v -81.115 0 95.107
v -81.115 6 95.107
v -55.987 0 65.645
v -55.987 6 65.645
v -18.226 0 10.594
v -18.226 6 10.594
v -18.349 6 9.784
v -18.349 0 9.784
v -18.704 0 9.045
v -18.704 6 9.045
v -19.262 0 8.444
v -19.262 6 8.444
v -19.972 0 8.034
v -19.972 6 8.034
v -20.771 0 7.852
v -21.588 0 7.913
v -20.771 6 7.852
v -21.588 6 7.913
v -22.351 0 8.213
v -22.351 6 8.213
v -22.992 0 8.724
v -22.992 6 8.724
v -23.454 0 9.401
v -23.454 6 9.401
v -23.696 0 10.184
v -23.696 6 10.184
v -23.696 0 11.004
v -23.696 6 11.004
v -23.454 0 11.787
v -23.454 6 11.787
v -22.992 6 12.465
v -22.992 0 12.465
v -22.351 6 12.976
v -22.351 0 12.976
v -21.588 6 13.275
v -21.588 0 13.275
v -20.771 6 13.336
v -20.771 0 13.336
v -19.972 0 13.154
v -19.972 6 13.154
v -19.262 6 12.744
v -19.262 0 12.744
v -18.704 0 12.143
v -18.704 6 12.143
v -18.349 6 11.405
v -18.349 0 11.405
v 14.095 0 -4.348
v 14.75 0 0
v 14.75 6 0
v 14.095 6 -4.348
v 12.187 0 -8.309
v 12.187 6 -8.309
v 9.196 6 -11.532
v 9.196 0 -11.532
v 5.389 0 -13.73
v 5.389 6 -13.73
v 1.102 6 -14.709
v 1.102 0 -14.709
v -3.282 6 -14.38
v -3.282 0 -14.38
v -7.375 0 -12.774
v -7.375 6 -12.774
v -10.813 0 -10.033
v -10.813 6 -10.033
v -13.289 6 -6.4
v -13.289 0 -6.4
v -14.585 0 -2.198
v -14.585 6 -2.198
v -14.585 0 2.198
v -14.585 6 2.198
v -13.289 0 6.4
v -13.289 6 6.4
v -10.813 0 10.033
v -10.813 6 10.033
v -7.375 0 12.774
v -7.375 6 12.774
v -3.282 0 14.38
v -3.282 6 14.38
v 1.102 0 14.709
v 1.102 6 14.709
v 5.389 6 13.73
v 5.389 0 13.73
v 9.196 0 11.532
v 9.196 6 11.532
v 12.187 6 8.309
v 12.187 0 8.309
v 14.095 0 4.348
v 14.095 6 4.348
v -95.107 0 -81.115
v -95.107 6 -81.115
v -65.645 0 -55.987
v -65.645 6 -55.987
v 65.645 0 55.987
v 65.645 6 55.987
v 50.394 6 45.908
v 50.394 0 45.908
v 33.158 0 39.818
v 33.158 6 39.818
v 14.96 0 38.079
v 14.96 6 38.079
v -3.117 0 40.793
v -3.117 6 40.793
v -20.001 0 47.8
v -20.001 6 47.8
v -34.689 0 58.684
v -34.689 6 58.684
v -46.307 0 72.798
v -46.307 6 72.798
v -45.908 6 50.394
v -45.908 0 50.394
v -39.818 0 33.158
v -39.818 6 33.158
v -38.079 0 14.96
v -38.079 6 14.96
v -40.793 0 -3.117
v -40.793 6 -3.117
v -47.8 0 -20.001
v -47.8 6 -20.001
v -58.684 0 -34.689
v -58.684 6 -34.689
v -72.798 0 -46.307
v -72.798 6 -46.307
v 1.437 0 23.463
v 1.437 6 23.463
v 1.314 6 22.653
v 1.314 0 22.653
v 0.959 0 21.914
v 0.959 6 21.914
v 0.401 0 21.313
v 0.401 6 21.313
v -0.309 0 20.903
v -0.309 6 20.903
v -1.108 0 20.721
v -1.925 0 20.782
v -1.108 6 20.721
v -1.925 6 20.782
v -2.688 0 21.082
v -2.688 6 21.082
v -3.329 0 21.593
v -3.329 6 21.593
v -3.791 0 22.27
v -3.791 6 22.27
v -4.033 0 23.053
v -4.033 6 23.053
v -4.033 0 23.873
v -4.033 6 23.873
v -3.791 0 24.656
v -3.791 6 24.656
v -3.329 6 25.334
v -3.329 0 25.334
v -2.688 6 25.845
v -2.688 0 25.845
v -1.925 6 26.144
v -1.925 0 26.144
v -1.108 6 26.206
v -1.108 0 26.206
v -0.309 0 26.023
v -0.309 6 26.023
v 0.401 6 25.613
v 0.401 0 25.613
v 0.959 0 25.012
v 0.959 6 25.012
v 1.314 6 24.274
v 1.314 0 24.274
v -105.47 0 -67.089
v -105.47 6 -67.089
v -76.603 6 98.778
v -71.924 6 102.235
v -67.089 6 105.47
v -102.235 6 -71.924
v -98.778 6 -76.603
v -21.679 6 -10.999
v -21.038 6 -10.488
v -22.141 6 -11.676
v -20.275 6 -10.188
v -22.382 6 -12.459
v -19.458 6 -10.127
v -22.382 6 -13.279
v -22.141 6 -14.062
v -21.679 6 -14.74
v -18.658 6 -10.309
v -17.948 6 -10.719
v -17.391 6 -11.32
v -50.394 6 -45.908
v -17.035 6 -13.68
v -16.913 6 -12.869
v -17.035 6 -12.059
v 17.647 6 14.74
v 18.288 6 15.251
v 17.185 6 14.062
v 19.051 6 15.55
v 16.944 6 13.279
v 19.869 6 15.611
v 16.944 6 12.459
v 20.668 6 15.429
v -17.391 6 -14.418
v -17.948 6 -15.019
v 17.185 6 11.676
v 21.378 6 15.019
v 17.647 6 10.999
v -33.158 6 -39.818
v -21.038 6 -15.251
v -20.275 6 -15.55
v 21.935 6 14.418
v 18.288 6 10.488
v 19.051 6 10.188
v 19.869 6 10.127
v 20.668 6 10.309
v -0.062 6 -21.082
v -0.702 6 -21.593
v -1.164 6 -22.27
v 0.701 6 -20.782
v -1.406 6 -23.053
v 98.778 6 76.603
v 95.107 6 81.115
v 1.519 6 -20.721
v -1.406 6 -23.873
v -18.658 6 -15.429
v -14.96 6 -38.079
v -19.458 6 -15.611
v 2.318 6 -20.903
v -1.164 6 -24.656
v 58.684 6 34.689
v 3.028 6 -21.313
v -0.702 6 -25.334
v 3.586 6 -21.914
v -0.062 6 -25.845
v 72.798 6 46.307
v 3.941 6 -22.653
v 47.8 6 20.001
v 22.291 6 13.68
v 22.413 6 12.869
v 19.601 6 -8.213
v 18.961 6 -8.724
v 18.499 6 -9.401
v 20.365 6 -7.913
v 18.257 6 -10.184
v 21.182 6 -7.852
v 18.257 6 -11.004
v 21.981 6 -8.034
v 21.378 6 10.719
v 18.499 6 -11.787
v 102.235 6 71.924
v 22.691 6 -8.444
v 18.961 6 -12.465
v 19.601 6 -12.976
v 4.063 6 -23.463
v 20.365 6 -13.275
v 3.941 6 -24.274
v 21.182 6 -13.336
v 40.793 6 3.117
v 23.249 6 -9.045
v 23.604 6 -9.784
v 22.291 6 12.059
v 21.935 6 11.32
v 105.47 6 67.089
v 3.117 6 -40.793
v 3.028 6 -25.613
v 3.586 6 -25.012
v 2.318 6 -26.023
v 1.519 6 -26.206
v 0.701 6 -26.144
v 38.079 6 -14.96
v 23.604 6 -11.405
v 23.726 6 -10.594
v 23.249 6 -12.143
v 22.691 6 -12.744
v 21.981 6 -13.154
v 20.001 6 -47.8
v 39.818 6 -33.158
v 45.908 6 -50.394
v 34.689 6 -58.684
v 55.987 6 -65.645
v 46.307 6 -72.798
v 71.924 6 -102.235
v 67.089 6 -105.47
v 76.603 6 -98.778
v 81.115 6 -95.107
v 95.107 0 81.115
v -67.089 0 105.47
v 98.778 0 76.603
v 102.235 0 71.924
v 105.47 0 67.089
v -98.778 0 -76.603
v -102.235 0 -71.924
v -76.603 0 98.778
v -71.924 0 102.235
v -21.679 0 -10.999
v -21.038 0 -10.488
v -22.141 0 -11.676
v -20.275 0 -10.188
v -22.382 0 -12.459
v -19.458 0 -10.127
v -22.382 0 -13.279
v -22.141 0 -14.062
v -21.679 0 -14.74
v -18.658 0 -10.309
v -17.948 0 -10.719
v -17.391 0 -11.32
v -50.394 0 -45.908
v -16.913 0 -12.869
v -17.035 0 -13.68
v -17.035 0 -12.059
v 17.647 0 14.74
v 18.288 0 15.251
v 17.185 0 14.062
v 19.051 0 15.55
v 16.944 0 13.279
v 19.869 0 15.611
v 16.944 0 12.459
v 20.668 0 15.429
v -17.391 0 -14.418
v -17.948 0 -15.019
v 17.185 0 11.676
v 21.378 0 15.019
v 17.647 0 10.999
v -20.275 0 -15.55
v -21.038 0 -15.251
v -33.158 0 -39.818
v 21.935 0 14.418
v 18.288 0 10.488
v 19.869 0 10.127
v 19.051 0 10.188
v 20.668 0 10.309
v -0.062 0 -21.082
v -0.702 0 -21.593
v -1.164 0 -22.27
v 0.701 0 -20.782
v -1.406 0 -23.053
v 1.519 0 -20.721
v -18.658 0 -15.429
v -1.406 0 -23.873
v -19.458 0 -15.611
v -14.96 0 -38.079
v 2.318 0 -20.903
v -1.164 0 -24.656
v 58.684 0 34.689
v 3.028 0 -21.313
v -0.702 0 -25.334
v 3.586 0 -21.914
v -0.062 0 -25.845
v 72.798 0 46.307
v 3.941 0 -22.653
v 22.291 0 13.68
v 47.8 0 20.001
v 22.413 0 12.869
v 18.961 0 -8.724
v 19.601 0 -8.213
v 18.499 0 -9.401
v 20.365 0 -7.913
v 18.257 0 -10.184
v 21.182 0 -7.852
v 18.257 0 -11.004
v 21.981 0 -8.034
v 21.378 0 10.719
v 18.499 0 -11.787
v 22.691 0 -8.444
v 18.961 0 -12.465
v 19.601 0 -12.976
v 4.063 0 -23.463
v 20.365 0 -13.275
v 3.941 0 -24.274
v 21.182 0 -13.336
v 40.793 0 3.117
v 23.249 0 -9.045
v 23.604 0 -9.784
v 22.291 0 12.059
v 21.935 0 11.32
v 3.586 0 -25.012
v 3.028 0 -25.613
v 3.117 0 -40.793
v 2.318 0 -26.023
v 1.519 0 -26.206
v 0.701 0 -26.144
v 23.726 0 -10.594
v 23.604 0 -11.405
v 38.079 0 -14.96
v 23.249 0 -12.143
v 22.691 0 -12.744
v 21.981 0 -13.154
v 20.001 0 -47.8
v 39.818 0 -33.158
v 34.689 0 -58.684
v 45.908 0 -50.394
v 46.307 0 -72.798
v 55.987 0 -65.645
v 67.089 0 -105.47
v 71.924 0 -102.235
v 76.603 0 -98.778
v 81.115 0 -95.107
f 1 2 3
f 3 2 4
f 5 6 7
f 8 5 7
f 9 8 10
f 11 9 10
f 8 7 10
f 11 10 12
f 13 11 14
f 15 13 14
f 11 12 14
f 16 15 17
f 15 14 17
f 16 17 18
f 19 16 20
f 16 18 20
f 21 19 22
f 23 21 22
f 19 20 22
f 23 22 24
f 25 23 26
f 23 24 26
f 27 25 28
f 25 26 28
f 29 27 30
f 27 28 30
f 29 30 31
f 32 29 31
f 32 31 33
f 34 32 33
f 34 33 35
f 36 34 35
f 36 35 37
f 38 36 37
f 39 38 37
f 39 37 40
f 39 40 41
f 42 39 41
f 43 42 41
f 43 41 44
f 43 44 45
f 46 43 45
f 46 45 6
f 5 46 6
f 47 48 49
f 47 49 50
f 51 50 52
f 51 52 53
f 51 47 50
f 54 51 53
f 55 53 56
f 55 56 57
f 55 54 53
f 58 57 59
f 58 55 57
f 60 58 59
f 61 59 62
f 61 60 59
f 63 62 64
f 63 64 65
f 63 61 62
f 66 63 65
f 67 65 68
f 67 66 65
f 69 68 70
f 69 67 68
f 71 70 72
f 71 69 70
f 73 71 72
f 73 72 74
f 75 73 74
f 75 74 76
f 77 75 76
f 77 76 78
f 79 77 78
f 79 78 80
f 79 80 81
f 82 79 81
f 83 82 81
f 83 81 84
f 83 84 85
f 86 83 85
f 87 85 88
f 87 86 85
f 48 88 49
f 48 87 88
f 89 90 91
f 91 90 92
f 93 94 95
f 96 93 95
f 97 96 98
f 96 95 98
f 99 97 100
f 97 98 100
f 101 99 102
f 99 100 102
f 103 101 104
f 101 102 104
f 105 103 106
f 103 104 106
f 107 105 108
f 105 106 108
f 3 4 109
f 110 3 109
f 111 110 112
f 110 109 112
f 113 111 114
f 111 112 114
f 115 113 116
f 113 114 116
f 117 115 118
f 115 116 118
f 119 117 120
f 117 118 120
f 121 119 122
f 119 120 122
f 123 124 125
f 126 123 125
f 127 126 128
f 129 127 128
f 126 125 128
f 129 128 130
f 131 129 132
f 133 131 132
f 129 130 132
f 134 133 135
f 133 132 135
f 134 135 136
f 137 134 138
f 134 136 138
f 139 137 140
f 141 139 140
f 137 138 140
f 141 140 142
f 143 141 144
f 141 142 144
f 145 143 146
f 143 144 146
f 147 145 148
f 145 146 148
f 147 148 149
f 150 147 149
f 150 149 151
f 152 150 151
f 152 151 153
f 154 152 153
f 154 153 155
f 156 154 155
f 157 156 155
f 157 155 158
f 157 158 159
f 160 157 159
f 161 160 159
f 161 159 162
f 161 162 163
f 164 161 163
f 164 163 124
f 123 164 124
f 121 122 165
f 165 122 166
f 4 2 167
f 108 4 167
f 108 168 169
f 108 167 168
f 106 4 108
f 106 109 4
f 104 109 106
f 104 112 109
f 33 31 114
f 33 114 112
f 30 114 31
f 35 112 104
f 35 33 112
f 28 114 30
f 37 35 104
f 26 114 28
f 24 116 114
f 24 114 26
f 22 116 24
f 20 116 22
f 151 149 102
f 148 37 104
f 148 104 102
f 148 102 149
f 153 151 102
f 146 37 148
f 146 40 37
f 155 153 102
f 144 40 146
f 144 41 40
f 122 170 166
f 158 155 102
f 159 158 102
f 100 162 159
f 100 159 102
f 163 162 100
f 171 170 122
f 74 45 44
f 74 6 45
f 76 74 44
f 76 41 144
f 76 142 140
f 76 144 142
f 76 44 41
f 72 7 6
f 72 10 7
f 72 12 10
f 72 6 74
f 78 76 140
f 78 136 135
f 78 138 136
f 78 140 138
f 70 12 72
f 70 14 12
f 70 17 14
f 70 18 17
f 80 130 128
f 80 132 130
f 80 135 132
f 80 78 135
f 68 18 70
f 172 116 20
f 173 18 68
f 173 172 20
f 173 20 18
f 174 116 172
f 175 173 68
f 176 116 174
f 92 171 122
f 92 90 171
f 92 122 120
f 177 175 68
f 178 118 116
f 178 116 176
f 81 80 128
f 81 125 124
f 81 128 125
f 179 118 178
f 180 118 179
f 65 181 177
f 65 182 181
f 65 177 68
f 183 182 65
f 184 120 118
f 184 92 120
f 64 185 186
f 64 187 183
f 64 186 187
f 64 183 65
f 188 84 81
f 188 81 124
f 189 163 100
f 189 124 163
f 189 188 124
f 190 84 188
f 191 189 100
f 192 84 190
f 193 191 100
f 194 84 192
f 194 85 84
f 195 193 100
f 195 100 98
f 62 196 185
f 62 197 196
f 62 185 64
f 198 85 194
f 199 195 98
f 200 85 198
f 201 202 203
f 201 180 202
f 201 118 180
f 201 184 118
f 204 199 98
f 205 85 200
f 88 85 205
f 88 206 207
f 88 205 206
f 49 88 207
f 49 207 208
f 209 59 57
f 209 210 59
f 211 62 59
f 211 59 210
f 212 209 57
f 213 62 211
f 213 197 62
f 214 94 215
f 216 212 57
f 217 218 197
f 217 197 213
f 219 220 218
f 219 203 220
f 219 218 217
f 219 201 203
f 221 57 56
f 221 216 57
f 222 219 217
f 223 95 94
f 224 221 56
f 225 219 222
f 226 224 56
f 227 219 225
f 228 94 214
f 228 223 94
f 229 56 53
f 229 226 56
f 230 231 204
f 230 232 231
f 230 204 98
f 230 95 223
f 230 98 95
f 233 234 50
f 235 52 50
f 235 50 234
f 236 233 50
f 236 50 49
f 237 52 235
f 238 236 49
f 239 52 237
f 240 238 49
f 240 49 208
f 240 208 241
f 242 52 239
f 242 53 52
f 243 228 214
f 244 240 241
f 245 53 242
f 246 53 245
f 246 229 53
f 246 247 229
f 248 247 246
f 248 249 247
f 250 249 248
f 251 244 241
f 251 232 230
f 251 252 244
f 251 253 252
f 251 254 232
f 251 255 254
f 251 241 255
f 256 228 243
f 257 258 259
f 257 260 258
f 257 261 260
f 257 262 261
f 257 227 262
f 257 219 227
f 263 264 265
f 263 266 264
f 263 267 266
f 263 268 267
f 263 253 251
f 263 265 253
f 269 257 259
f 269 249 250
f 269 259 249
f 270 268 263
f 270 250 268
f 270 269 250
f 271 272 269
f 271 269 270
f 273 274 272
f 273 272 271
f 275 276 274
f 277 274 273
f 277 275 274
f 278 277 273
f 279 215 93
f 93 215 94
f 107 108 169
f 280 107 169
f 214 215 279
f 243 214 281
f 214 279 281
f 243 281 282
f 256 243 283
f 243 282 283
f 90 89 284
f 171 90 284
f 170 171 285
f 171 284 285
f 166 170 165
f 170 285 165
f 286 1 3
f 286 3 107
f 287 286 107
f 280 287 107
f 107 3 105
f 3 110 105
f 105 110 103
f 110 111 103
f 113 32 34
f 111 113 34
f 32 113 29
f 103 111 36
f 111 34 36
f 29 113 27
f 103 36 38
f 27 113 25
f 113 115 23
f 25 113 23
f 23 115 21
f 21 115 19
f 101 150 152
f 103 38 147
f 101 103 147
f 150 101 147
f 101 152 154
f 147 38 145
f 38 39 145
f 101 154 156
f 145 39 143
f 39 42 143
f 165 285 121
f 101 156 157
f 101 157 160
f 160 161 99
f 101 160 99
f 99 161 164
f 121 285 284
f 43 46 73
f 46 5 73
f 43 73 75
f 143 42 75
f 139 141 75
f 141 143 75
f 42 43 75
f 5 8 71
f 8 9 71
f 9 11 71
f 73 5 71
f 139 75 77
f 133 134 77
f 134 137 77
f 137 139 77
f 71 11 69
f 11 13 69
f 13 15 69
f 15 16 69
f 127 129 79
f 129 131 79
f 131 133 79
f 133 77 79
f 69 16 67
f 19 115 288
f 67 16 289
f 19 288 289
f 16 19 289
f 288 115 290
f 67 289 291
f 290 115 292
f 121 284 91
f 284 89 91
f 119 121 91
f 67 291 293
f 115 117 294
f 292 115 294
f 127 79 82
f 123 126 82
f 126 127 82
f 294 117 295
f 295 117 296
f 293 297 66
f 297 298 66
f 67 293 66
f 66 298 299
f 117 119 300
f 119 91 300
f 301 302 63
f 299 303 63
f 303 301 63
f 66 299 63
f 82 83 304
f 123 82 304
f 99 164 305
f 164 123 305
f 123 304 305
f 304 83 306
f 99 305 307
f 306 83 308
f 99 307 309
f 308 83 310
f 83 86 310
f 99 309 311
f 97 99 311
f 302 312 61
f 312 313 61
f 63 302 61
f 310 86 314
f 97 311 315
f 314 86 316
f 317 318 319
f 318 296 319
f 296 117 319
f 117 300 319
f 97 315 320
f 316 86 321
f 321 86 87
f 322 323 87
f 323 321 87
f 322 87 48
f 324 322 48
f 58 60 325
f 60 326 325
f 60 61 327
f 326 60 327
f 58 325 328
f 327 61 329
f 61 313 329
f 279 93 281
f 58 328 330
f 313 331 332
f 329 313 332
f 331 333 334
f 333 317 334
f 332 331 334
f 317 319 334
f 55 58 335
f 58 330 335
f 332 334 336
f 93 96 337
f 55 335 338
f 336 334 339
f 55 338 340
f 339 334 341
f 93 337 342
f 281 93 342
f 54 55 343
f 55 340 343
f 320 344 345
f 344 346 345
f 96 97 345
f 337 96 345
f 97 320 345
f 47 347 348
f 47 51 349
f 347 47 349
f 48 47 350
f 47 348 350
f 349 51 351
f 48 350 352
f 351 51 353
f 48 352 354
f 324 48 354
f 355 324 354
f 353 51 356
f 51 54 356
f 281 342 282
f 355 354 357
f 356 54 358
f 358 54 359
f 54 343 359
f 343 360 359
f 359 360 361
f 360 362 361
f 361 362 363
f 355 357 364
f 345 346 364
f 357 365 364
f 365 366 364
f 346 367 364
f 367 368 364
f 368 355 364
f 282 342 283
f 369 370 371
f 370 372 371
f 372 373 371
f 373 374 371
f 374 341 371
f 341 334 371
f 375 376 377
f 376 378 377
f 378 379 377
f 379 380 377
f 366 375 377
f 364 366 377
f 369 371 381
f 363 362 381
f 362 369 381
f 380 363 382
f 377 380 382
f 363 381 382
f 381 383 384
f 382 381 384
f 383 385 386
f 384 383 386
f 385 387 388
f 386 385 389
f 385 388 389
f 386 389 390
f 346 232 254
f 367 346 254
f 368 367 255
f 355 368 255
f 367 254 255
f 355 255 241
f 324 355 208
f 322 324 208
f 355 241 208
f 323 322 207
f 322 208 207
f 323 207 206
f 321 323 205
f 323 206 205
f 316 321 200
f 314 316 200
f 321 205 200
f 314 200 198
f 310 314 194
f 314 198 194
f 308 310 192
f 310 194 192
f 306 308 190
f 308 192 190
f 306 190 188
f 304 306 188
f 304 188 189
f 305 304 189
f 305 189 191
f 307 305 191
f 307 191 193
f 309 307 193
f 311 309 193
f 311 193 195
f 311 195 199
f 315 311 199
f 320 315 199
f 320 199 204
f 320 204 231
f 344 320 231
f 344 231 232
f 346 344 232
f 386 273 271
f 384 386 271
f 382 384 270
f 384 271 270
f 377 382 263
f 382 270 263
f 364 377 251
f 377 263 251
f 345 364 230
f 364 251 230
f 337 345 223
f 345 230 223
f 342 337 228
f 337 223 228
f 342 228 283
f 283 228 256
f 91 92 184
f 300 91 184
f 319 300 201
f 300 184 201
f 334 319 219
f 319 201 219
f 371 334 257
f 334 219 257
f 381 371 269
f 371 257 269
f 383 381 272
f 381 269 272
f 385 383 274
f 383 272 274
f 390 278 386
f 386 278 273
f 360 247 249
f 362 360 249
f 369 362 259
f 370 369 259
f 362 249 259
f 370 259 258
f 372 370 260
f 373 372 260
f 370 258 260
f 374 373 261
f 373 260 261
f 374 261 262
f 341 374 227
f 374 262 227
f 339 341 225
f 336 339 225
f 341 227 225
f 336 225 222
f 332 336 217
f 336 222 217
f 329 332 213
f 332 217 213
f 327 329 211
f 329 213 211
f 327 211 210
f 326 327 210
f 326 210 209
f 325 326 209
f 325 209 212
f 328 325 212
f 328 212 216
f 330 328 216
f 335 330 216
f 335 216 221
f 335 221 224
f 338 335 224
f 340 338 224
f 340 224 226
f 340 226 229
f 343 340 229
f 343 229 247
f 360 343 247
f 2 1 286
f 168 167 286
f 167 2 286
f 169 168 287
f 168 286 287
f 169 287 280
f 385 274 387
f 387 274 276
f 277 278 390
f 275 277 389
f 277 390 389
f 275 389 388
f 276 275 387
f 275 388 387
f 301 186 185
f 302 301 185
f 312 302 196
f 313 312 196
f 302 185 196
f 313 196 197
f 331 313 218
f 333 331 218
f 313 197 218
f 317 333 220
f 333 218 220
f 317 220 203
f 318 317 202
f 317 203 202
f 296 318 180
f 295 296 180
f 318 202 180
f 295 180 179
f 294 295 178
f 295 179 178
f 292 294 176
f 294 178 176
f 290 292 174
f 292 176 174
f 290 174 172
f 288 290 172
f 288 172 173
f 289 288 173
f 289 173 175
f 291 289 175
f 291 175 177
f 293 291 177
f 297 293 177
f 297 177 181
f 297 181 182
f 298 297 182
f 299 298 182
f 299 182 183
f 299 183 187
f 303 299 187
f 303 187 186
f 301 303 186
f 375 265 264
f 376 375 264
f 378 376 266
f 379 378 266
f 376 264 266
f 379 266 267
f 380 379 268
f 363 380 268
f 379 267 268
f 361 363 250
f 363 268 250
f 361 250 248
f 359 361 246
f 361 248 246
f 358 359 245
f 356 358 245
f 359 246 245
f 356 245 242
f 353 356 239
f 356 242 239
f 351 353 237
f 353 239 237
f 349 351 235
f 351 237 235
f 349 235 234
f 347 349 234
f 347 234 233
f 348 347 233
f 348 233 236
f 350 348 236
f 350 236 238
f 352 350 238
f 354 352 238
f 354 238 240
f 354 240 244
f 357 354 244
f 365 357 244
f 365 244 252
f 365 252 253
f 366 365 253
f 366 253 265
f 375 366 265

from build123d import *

# Parameters (mm, degrees)
SKETCH1_R           = 125
SKETCH1_R_2         = 14.75
BOSS_EXTRUDE1_DEPTH = 6
CUT_EXTRUDE1_DEPTH  = 6
CIRPATTERN1_COUNT   = 4
SKETCH3_R           = 2.75
CUT_EXTRUDE2_DEPTH  = 10


with BuildPart() as part:
    # Sketch1 → Boss-Extrude1 (new body)
    with BuildSketch(Plane(origin=(0, 0, 0), x_dir=(1, 0, 0), z_dir=(0, 1, 0))):
        Circle(SKETCH1_R)
        Circle(SKETCH1_R_2, mode=Mode.SUBTRACT)
    extrude(amount=BOSS_EXTRUDE1_DEPTH)

    # Sketch2 → Cut-Extrude1 (cut)
    with BuildSketch(Plane(origin=(0, 6, 0), x_dir=(1, 0, 0), z_dir=(0, 1, 0))):
        with BuildLine():
            Line((-46.306580885, -72.797871526), (-67.089494394, -105.470373764))
            Line((-67.089494394, -105.470373764), (-67.089494394, -164.92916021))
            Line((-67.089494394, -164.92916021), (95.10689036, -142.696592277))
            Line((95.10689036, -142.696592277), (95.10689036, -81.115223023))
            Line((95.10689036, -81.115223023), (65.644777188, -55.987433946))
            ThreePointArc((65.644777188, -55.987433946), (5.838619266, -38.883066128), (-46.306580885, -72.797871526))
        make_face()
    cut_extrude1 = extrude(amount=-CUT_EXTRUDE1_DEPTH, mode=Mode.SUBTRACT)

    # CirPattern1: Cut-Extrude1 ×4 about axis
    cirpattern1_axis = Axis((0, 0, 0), (0, 1, 0))
    for i in range(1, CIRPATTERN1_COUNT):
        add(cut_extrude1.rotate(cirpattern1_axis, i * 360 / CIRPATTERN1_COUNT), mode=Mode.SUBTRACT)

    # Sketch3 → Cut-Extrude2 (cut)
    with BuildSketch(Plane(origin=(0, 6, 0), x_dir=(1, 0, 0), z_dir=(0, 1, 0))):
        with Locations((-1.313428811, -23.463267137)):
            Circle(SKETCH3_R)
        with Locations((19.663070991, -12.869096285)):
            Circle(SKETCH3_R)
        with Locations((20.976499803, 10.594170852)):
            Circle(SKETCH3_R)
        with Locations((1.313428812, 23.463267137)):
            Circle(SKETCH3_R)
        with Locations((-19.663070991, 12.869096286)):
            Circle(SKETCH3_R)
        with Locations((-20.976499802, -10.594170852)):
            Circle(SKETCH3_R)
    extrude(amount=-CUT_EXTRUDE2_DEPTH, mode=Mode.SUBTRACT)


solid = part.part
